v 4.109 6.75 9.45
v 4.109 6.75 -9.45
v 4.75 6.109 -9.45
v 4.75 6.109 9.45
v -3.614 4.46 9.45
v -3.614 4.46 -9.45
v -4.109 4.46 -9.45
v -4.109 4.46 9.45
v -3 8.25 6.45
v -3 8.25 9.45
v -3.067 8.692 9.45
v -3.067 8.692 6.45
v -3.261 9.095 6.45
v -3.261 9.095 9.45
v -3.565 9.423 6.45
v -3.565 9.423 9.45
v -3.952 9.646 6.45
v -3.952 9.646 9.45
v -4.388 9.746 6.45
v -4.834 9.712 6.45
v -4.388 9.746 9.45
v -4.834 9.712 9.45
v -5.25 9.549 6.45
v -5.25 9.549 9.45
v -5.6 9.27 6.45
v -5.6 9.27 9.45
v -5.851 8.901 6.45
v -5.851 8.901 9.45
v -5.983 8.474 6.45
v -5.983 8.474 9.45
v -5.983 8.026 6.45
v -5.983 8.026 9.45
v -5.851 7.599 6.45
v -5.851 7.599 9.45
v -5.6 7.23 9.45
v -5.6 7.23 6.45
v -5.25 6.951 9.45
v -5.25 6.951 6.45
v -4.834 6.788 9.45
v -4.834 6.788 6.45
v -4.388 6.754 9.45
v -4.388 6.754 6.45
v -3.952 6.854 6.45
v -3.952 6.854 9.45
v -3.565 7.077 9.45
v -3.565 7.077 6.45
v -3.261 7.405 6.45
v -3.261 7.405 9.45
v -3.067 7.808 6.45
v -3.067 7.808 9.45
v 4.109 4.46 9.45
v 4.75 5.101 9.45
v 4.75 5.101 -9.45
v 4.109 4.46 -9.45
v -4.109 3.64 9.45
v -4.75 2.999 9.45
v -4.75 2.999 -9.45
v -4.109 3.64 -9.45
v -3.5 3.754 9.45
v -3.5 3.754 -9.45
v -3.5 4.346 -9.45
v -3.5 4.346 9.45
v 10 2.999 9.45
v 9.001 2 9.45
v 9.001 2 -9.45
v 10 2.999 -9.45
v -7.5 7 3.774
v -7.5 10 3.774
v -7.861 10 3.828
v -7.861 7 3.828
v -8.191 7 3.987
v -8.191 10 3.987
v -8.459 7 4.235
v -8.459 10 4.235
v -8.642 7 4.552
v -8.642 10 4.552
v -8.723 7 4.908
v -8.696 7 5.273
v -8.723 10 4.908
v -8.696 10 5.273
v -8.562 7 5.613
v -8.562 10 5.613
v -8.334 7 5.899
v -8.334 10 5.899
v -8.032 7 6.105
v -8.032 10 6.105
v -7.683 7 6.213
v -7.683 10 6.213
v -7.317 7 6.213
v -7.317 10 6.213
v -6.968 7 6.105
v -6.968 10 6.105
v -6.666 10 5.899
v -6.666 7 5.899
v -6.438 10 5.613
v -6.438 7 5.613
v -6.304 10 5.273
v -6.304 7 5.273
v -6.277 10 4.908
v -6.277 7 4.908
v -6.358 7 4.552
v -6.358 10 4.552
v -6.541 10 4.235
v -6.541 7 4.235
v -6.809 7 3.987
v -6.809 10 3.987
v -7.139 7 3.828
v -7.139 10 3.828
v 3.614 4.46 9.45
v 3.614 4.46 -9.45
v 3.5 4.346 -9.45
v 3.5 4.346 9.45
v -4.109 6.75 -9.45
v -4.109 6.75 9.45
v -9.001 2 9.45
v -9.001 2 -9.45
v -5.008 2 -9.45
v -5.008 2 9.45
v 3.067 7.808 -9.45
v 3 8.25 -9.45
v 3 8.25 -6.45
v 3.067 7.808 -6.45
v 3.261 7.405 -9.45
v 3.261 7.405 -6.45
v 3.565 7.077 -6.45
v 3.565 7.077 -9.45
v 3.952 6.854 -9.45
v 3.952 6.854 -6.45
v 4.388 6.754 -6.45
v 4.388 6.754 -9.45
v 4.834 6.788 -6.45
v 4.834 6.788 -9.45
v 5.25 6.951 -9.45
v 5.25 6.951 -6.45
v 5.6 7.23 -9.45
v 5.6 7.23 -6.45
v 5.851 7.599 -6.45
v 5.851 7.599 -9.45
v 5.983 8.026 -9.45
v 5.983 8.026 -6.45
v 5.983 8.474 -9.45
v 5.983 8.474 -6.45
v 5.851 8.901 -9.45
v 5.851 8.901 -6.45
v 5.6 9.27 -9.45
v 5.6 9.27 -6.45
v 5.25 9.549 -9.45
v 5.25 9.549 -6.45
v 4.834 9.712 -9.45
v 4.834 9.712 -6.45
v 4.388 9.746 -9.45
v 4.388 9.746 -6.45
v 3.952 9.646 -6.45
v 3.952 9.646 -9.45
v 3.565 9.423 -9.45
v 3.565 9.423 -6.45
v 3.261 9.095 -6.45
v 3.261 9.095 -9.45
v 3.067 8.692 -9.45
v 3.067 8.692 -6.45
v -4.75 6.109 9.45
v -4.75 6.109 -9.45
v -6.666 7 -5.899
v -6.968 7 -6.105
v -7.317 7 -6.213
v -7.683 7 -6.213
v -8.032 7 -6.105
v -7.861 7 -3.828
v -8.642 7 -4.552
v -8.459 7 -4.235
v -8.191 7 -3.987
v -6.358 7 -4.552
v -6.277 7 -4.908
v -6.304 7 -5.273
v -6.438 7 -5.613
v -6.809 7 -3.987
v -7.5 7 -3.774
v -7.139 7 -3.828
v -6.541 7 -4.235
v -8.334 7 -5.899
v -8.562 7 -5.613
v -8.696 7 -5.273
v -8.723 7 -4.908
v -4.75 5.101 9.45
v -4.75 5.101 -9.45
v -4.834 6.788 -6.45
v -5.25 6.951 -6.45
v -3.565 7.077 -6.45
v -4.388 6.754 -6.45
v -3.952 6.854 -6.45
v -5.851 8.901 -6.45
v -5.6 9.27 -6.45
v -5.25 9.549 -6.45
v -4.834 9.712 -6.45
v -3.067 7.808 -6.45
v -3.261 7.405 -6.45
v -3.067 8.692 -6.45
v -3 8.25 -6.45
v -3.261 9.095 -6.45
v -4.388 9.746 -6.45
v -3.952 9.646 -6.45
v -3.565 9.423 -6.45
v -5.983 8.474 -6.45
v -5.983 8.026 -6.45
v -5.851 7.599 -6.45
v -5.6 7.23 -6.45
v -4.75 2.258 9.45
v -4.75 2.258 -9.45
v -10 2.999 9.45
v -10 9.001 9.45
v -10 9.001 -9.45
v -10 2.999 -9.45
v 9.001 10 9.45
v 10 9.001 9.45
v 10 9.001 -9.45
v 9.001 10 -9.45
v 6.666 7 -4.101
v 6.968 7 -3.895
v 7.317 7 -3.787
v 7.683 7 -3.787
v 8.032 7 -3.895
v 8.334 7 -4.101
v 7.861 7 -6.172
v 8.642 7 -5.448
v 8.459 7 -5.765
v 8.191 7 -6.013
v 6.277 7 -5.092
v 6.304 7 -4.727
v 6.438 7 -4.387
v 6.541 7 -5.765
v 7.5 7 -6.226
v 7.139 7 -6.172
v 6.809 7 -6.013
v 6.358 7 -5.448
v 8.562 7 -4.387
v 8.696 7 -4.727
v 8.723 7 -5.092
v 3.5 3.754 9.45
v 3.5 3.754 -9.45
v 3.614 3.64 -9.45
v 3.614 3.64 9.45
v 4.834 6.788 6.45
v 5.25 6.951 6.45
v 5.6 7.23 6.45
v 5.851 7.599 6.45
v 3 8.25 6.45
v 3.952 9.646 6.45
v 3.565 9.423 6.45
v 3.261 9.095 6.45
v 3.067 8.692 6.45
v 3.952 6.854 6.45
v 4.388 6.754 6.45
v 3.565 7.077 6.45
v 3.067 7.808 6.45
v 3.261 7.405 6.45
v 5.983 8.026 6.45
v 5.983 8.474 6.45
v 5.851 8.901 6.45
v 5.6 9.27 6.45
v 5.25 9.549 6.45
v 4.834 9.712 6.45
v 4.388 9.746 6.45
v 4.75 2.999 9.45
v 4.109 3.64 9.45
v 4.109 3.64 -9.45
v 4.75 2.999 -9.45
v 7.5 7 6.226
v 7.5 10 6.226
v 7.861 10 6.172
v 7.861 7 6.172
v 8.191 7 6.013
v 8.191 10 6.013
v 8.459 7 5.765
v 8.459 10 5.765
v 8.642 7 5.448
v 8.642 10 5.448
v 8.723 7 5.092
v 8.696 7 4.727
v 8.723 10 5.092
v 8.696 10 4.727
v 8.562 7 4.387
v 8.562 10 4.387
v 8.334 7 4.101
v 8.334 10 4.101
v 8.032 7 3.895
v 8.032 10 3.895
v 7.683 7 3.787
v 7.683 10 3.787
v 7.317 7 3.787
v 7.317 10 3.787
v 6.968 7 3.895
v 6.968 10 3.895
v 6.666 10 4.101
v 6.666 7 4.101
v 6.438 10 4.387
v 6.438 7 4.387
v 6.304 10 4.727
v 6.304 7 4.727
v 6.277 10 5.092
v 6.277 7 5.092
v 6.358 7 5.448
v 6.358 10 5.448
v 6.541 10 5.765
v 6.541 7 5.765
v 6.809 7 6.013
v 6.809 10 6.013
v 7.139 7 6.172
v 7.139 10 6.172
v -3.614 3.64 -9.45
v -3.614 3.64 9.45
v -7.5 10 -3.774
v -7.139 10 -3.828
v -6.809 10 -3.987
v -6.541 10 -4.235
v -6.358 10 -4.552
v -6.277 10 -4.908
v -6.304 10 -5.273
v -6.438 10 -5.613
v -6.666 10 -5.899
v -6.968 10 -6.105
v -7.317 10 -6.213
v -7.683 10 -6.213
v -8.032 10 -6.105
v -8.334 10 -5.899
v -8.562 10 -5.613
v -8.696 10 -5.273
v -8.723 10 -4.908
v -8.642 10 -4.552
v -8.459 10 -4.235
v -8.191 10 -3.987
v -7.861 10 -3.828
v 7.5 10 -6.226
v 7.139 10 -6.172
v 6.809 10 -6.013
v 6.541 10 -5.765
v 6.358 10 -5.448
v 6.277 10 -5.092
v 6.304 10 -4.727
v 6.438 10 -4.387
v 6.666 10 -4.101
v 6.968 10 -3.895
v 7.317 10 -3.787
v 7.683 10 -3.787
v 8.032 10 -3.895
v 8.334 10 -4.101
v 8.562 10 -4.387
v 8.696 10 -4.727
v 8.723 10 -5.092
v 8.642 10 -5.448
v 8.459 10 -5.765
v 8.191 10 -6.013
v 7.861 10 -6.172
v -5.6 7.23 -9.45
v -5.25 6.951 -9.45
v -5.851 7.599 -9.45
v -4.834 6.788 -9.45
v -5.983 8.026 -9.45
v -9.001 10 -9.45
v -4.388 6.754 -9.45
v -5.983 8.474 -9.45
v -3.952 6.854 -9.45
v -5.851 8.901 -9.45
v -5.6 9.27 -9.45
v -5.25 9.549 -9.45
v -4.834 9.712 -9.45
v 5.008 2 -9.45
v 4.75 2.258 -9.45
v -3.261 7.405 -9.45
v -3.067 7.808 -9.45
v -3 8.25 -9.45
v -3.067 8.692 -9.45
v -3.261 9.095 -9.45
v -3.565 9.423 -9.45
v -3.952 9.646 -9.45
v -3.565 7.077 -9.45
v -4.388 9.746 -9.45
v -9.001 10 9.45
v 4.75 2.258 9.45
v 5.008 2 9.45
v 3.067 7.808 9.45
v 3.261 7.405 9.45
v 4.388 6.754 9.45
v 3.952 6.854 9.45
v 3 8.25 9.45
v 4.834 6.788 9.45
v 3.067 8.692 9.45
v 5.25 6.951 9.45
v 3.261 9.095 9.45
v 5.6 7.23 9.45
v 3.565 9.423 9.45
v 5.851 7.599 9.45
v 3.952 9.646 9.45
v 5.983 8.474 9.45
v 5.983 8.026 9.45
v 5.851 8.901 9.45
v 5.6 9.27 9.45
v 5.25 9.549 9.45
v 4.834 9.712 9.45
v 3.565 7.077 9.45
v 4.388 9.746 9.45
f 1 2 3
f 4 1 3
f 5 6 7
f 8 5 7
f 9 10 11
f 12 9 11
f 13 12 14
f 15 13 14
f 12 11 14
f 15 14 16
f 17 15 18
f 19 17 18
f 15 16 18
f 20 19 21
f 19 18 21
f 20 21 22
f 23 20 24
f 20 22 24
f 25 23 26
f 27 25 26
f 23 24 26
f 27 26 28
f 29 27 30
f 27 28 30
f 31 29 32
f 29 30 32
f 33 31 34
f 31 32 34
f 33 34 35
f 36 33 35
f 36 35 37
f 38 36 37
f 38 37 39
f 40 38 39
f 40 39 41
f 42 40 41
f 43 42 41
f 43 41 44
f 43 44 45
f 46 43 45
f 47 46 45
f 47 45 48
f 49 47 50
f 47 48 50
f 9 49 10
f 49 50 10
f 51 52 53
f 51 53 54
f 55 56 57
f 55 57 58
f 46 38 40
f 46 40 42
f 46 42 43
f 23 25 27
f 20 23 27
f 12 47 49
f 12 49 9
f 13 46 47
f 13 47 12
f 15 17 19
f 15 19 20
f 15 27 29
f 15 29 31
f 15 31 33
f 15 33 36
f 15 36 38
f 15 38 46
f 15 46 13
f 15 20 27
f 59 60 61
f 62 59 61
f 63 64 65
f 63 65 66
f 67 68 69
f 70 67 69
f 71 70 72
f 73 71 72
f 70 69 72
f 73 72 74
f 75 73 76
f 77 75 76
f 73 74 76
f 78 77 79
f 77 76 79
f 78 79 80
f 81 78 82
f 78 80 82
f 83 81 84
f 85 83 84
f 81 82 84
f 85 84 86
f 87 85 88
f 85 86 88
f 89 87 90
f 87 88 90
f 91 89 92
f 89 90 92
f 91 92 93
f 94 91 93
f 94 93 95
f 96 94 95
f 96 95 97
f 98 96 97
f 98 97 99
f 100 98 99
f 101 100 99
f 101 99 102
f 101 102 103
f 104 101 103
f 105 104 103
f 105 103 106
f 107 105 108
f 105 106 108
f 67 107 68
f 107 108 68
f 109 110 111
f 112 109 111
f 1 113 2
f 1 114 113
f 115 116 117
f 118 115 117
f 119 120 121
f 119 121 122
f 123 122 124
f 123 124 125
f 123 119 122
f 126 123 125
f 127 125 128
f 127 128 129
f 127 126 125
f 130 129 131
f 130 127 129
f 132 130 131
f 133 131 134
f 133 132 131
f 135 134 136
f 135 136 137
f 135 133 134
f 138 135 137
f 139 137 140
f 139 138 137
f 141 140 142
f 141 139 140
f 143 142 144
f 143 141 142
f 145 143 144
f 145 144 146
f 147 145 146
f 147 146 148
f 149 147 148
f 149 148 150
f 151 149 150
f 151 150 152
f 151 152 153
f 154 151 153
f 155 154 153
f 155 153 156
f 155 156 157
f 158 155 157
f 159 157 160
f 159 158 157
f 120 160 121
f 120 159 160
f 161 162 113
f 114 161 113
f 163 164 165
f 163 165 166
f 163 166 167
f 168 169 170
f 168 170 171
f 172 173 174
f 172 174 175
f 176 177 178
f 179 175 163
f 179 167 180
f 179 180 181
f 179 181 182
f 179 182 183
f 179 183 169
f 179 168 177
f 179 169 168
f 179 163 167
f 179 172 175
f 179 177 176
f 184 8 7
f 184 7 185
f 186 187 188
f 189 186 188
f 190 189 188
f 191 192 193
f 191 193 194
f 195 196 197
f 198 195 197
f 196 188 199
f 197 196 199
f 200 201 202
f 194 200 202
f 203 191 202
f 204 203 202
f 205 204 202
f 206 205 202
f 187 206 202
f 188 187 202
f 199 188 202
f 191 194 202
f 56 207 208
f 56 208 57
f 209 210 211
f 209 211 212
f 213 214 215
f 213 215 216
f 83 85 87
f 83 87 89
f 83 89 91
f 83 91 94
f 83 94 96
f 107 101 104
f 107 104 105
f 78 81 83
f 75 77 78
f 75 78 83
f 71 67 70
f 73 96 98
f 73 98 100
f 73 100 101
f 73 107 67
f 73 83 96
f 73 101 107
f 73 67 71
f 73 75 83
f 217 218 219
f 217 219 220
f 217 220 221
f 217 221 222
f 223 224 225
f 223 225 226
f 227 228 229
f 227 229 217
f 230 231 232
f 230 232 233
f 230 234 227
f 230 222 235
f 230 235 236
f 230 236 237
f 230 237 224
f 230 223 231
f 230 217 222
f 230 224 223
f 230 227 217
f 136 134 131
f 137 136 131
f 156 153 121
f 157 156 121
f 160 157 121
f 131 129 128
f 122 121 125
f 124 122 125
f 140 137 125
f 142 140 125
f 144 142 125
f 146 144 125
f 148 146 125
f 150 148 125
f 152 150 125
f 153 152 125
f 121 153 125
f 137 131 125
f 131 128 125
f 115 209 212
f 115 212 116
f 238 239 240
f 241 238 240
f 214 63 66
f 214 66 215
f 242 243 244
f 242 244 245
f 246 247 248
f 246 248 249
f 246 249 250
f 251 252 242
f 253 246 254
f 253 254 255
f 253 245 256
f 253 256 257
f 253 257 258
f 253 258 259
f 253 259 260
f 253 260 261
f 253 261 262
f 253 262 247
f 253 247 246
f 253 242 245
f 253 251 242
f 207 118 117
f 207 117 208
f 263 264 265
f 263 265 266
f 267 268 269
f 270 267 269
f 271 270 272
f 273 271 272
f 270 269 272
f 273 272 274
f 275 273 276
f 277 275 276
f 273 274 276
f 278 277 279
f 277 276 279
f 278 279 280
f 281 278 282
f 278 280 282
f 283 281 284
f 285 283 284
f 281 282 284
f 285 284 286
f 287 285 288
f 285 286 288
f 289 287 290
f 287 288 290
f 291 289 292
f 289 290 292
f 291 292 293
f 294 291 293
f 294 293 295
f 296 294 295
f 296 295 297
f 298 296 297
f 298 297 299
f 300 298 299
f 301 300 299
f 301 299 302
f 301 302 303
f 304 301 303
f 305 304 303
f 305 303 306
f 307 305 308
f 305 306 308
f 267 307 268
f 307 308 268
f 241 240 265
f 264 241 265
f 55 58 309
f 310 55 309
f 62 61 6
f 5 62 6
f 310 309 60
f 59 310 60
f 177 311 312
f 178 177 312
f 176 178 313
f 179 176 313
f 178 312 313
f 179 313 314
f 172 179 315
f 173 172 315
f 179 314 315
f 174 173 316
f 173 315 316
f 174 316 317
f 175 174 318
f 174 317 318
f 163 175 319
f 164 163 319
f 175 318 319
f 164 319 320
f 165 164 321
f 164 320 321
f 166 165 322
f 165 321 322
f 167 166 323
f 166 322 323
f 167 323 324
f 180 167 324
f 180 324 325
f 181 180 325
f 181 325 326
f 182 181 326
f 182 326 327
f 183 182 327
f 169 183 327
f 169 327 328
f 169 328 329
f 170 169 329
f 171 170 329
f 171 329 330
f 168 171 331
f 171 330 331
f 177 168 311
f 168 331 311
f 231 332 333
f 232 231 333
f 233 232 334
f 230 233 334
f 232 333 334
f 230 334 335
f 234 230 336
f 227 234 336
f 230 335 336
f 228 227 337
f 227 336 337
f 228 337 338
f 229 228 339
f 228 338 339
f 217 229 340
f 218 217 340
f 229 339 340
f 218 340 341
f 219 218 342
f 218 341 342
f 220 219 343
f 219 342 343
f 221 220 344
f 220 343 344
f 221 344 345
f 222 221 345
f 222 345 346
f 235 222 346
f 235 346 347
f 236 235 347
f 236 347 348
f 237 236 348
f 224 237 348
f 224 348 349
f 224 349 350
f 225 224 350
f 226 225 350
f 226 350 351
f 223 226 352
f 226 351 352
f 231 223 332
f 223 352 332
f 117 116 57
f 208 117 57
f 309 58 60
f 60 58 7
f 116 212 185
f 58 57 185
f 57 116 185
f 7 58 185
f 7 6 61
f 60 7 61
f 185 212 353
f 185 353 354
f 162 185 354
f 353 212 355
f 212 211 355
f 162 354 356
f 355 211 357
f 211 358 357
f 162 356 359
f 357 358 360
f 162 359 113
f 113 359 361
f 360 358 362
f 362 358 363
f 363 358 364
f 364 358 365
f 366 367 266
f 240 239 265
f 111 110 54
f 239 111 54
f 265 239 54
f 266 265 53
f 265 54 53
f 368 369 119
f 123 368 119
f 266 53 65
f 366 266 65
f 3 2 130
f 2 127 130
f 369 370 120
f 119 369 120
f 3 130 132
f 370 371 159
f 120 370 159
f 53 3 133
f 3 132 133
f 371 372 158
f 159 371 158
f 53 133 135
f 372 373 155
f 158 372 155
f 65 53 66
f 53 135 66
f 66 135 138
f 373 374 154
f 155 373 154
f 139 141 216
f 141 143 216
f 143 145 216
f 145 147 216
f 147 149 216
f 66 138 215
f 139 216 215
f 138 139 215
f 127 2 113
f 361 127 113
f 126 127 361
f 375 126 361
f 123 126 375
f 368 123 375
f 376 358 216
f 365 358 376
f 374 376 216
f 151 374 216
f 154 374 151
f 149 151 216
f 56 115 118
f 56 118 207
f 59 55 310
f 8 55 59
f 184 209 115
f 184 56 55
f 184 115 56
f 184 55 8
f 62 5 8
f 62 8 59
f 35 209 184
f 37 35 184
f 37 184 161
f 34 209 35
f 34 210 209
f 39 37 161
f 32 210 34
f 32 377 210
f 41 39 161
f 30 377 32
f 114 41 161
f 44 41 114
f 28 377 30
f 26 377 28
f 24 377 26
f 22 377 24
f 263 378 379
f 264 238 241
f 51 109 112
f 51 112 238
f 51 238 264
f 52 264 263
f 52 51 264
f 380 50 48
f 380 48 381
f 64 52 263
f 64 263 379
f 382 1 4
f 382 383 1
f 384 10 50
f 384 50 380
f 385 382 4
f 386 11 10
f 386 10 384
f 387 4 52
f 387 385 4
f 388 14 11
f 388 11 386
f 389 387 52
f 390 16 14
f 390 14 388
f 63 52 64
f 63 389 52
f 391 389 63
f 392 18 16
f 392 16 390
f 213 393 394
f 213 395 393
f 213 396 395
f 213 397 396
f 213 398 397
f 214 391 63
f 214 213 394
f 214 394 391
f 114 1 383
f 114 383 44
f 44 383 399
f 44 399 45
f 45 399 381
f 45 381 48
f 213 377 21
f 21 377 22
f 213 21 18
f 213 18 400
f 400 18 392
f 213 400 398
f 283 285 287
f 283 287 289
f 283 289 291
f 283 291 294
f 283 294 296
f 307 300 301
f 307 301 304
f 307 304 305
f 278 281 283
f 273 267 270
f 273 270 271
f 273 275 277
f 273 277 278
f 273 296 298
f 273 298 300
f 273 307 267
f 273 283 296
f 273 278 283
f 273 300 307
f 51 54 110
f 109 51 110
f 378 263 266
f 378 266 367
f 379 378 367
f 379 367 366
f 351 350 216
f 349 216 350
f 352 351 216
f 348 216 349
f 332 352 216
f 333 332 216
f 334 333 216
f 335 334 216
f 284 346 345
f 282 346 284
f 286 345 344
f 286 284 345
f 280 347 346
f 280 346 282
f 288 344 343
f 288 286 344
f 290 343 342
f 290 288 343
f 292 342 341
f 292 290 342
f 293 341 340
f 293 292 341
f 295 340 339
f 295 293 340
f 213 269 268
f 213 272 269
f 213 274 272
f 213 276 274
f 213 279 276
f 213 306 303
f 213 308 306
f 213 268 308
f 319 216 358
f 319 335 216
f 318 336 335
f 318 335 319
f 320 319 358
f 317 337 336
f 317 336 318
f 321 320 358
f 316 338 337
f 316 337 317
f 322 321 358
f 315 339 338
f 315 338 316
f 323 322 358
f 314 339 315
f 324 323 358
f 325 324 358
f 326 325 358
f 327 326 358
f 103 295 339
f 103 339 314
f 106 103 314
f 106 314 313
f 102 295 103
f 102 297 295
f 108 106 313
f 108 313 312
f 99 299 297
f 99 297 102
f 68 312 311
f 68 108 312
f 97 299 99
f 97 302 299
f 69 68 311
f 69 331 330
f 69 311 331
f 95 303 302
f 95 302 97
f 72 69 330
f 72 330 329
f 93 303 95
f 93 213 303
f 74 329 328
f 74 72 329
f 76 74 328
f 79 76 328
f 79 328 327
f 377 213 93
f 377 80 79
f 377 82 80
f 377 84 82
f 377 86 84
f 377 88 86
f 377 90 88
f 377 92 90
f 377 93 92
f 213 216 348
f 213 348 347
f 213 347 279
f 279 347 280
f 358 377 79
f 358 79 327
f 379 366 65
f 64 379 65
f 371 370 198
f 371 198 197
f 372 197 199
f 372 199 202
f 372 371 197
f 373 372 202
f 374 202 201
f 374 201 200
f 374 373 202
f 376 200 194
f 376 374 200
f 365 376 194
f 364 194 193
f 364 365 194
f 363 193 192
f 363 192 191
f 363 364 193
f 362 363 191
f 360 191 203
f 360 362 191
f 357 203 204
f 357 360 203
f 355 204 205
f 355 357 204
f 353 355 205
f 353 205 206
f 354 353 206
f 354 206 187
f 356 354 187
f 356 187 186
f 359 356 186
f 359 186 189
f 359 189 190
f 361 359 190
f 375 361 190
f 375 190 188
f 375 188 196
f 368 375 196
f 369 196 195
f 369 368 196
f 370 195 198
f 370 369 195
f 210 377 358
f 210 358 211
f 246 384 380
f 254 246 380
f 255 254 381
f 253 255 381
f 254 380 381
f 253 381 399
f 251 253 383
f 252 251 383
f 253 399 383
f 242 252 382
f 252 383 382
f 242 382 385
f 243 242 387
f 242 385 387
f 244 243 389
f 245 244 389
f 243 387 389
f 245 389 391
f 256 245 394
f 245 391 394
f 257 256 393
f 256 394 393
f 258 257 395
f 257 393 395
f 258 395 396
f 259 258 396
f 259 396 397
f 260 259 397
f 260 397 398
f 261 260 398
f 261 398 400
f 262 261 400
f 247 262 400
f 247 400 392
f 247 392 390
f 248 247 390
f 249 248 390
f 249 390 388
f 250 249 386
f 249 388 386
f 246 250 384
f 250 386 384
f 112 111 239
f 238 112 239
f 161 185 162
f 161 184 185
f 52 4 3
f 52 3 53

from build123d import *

# Parameters (mm, degrees)
BOSS_EXTRUDE1_DEPTH = 9.45
SKETCH3_R           = 1.5
CUT_EXTRUDE1_DEPTH  = 3
SKETCH4_R           = 1.226272584
CUT_EXTRUDE2_DEPTH  = 3


with BuildPart() as part:
    # Sketch2 → Boss-Extrude1 (new, symmetric)
    with BuildSketch(Plane.XY):
        Polygon((-4.108578644, 6.75), (4.108578644, 6.75), (4.75, 6.108578644), (4.75, 5.101471863), (4.108578644, 4.460050506), (3.613603897, 4.460050506), (3.5, 4.346446609), (3.5, 3.753553391), (3.613603897, 3.639949494), (4.108578644, 3.639949494), (4.75, 2.998528137), (4.75, 2.257905525), (5.007905525, 2), (9.001471863, 2), (10, 2.998528137), (10, 9.001471863), (9.001471863, 10), (-9.001471863, 10), (-10, 9.001471863), (-10, 2.998528137), (-9.001471863, 2), (-5.007905525, 2), (-4.75, 2.257905525), (-4.75, 2.998528137), (-4.108578644, 3.639949494), (-3.613603897, 3.639949494), (-3.5, 3.753553391), (-3.5, 4.346446609), (-3.613603897, 4.460050506), (-4.108578644, 4.460050506), (-4.75, 5.101471863), (-4.75, 6.108578644), align=None)
    extrude(amount=BOSS_EXTRUDE1_DEPTH, both=True)

    # Sketch3 → Cut-Extrude1 (cut)
    with BuildSketch(Plane.XY.offset(9.45)):
        with Locations((-4.5, 8.25)):
            Circle(SKETCH3_R)
        with Locations(Location((4.5, 8.25, 0), (0, 0, 180))):
            Circle(SKETCH3_R)
    cut_extrude1 = extrude(amount=-CUT_EXTRUDE1_DEPTH, mode=Mode.SUBTRACT)

    # Mirror1: Cut-Extrude1 across plane
    add(cut_extrude1.mirror(Plane.XY), mode=Mode.SUBTRACT)

    # Sketch4 → Cut-Extrude2 (cut)
    with BuildSketch(Plane(origin=(0, 10, 0), x_dir=(1, 0, 0), z_dir=(0, 1, 0))):
        with Locations(Location((7.5, -5, 0), (0, 0, 270))):
            Circle(SKETCH4_R)
        with Locations(Location((-7.5, -5, 0), (0, 0, 90))):
            Circle(SKETCH4_R)
        with Locations(Location((-7.5, 5, 0), (0, 0, 270))):
            Circle(SKETCH4_R)
        with Locations(Location((7.5, 5, 0), (0, 0, 90))):
            Circle(SKETCH4_R)
    extrude(amount=-CUT_EXTRUDE2_DEPTH, mode=Mode.SUBTRACT)


solid = part.part
